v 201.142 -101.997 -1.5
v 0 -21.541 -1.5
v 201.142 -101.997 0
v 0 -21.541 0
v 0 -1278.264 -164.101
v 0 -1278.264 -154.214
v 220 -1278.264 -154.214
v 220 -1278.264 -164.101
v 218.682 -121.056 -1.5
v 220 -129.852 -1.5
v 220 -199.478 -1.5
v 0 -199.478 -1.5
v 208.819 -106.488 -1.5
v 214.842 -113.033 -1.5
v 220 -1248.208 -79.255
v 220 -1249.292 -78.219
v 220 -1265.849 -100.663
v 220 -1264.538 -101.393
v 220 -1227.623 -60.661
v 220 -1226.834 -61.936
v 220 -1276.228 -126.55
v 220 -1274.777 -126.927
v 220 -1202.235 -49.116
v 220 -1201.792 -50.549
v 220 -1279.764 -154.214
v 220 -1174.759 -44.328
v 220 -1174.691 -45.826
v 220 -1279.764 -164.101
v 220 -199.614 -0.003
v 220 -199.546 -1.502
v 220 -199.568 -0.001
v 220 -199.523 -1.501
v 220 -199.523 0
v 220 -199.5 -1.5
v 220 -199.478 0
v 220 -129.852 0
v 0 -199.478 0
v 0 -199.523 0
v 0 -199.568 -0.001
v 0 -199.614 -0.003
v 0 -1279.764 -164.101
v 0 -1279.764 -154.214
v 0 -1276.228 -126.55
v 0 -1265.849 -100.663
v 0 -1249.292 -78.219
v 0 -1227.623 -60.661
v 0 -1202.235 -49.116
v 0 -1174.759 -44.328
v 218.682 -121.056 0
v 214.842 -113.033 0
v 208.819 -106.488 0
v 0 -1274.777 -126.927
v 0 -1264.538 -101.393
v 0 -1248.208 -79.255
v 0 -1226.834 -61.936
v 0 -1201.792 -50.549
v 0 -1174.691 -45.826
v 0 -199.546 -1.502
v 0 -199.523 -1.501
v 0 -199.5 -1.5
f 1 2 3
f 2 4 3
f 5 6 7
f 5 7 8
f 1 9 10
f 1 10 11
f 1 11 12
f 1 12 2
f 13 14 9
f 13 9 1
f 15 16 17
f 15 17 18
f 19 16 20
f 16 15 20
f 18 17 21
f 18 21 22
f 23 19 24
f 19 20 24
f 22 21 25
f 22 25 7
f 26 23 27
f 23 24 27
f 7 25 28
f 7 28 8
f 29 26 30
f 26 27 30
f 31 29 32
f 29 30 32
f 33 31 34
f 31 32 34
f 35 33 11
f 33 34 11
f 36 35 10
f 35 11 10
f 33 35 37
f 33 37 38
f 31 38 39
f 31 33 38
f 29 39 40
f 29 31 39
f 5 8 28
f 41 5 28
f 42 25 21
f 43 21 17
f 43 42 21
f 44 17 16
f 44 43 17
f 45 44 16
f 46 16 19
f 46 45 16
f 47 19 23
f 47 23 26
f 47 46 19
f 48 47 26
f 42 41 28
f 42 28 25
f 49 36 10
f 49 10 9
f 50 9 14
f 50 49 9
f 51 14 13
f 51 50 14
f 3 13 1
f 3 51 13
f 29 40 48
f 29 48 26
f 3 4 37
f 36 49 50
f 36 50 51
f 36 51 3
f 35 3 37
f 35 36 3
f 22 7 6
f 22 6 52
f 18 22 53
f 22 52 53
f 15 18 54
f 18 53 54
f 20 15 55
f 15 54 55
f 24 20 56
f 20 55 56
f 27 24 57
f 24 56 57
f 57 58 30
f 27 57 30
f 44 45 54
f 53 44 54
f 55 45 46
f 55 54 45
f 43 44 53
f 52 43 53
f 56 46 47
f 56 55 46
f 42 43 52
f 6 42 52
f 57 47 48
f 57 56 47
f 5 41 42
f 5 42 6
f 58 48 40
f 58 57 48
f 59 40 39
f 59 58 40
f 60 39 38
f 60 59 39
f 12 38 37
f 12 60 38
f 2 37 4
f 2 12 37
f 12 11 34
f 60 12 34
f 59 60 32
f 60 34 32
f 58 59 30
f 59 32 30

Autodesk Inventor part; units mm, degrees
ref_plane "Work Plane6" through (0, -199.5457, 0) normal (0, -0.0454077, 0.9989685) x (1, 0, 0)
sketch "Sketch4" plane through (0, -199.5457, 0) normal (0, -0.0454077, 0.9989685) x (1, 0, 0)
  line L0 (220, 0) -> (220, -976.9106)
  line L1 (0, 0) -> (220, 0)
  line L2 (0, 0) -> (0, -976.9106)
  line L3 (0, -976.9106) -> (220, -976.9106)
  point P0 (0, 199.3399)
extrude "Plate4" add sketch "Sketch4" against normal blind 1.5
ref_plane "Work Plane7" through (0, 0, 0) normal (0, 0, 1) x (1, 0, 0)
sketch "Sketch5" plane through (0, 0, 0) normal (0, 0, -1) x (1, 0, 0)
  line L0 (0, -166.5116) -> (220, -166.5116)
  line L1 (220, -166.5116) -> (220, 0.4543)
  line L2 (220, 0.4543) -> (0, 0.4543)
  line L3 (0, 0.4543) -> (0, -166.5116)
edge flange "Flange3" height 200 angle 90 thickness 1.5 bend radius 1.5 thickness toward (0, 0, -1) relief tear relief width 1.5 relief depth 0.75 edges at (110, -199.4776, -1.4985) wall of the first edge with corners at (0, -166.5116, 0) (220, -166.5116, 0) (220, 0.4543, 0) (0, 0.4543, 0)
bend "Bend3"
corner "Corner3"
sketch "Sketch6" plane through (0, 0.4543, 0) normal (0, 0, 1) x (1, 0, 0)
  arc A0 (220, -130.306) -> (201.1417, -102.4517) centre (190, -130.306) ccw projected
  line L0 (0, -21.995) -> (201.1417, -102.4517) projected
  line L1 (0, -21.995) -> (0, -200) projected
  line L2 (0, -200) -> (220, -200) projected
  line L3 (220, -130.306) -> (220, -200) projected
  line L4 (0, -199.9319) -> (220, -199.9319) projected
  line L5 (220, 0) -> (220, -199.9319) projected
  line L6 (0, 0) -> (220, 0) projected
  line L7 (0, -199.9319) -> (0, 0) projected
  point P0 (0, -0.4543)
  point P1 (220, -130.306)
extrude "Extrusion1" cut sketch "Sketch6" against normal through all contours A0 L0 L7 L6 L5
ref_plane "Work Plane9" through (125, -1279.7641, -134.7549) normal (0, -1, 0) x (-1, 0, 0)
sketch "Sketch8" plane through (125, -1279.7641, -134.7549) normal (0, 1, 0) x (-1, 0, 0)
  line L0 (-95, -84.1525) -> (125, -84.1525)
  line L1 (125, -84.1525) -> (125, 29.3459)
  line L2 (125, 29.3459) -> (-95, 29.3459)
  line L3 (-95, 29.3459) -> (-95, -84.1525)
edge flange "Flange5" height 115 angle 90 thickness 1.5 bend radius 108.5 thickness toward (0, 1, 0) relief tear relief width 1.5 relief depth 0.75 edges at (110, -1175.3806, -45.8577) wall of the first edge with corners at (220, -1279.7641, -50.6024) (0, -1279.7641, -50.6024) (0, -1279.7641, -164.1008) (220, -1279.7641, -164.1008)
bend "Bend5"
corner "Corner5"
ref_plane "Work Plane8" through (125, -1278.2641, -134.7549) normal (0, -1, 0) x (-1, 0, 0)
sketch "Sketch9" plane through (220, -1279.7641, -164.1008) normal (1, 0, 0) x (0, 0, -1)
  line L0 (-9.8864, 1.5) -> (-9.8864, 0) projected
  arc A0 (-118.2745, 105.0733) -> (-9.8864, 1.5) centre (-9.8864, 110) ccw projected
  line L1 (-119.773, 105.0052) -> (-118.2745, 105.0733) projected
  arc A1 (-119.773, 105.0052) -> (-9.8864, 0) centre (-9.8864, 110) ccw projected
  line L2 (-9.8864, 1.5) -> (-9.8864, 0) projected
  line L3 (-9.8864, 0) -> (0, 0) projected
  line L4 (0, 1.5) -> (0, 0) projected
  line L5 (-9.8864, 1.5) -> (0, 1.5) projected
  line L6 (-29.3211, 1.7305) -> (-29.0561, 3.2069)
  point P0 (-164.1008, 1279.7641)
sketch3d "3D Sketch1"
sketch "Sketch1" plane through (0, 0, 0) normal (0, 0, 1) x (1, 0, 0)
  line L0 (1250.1265, -201.1417) -> (1330.5832, 0) projected
  line L1 (0, 0) -> (1330.5832, 0) projected
  line L2 (0, -220) -> (0, 0) projected
  line L3 (1222.2722, -220) -> (0, -220) projected
  arc A0 (1222.2722, -220) -> (1250.1265, -201.1417) centre (1222.2722, -190) ccw projected
equation "\"d22\" = Thickness"
equation "\"d23\" = BendReliefWidth"
equation "\"d24\" = BendReliefDepth"
equation "\"d25\" = MinimumRemnant"
equation "\"d26\" = TransitionRadius"
equation "\"d29\" = BendRadius"
equation "\"d30\" = CornerReliefSize"
equation "\"d31\" = GapSize"
equation "\"d32\" = JacobiRadiusSize"
equation "\"d46\" = BendReliefWidth"
equation "\"d47\" = BendReliefDepth"
equation "\"d48\" = MinimumRemnant"
equation "\"d49\" = TransitionRadius"
equation "\"d53\" = CornerReliefSize"
equation "\"d54\" = GapSize"
equation "\"d55\" = JacobiRadiusSize"
equation "\"BendRadius\" = Thickness"
equation "\"BendReliefWidth\" = Thickness"
equation "\"BendReliefDepth\" = 0.5 * Thickness"
equation "\"CornerReliefSize\" = 4 * Thickness"
equation "\"MinimumRemnant\" = 2 * Thickness"
equation "\"TransitionRadius\" = BendRadius"
equation "\"JacobiRadiusSize\" = BendRadius"
equation "\"GapSize\" = Thickness"
equation "\"Thickness\" = 1.5"
properties part number "CARCASA_ALUM_3"
